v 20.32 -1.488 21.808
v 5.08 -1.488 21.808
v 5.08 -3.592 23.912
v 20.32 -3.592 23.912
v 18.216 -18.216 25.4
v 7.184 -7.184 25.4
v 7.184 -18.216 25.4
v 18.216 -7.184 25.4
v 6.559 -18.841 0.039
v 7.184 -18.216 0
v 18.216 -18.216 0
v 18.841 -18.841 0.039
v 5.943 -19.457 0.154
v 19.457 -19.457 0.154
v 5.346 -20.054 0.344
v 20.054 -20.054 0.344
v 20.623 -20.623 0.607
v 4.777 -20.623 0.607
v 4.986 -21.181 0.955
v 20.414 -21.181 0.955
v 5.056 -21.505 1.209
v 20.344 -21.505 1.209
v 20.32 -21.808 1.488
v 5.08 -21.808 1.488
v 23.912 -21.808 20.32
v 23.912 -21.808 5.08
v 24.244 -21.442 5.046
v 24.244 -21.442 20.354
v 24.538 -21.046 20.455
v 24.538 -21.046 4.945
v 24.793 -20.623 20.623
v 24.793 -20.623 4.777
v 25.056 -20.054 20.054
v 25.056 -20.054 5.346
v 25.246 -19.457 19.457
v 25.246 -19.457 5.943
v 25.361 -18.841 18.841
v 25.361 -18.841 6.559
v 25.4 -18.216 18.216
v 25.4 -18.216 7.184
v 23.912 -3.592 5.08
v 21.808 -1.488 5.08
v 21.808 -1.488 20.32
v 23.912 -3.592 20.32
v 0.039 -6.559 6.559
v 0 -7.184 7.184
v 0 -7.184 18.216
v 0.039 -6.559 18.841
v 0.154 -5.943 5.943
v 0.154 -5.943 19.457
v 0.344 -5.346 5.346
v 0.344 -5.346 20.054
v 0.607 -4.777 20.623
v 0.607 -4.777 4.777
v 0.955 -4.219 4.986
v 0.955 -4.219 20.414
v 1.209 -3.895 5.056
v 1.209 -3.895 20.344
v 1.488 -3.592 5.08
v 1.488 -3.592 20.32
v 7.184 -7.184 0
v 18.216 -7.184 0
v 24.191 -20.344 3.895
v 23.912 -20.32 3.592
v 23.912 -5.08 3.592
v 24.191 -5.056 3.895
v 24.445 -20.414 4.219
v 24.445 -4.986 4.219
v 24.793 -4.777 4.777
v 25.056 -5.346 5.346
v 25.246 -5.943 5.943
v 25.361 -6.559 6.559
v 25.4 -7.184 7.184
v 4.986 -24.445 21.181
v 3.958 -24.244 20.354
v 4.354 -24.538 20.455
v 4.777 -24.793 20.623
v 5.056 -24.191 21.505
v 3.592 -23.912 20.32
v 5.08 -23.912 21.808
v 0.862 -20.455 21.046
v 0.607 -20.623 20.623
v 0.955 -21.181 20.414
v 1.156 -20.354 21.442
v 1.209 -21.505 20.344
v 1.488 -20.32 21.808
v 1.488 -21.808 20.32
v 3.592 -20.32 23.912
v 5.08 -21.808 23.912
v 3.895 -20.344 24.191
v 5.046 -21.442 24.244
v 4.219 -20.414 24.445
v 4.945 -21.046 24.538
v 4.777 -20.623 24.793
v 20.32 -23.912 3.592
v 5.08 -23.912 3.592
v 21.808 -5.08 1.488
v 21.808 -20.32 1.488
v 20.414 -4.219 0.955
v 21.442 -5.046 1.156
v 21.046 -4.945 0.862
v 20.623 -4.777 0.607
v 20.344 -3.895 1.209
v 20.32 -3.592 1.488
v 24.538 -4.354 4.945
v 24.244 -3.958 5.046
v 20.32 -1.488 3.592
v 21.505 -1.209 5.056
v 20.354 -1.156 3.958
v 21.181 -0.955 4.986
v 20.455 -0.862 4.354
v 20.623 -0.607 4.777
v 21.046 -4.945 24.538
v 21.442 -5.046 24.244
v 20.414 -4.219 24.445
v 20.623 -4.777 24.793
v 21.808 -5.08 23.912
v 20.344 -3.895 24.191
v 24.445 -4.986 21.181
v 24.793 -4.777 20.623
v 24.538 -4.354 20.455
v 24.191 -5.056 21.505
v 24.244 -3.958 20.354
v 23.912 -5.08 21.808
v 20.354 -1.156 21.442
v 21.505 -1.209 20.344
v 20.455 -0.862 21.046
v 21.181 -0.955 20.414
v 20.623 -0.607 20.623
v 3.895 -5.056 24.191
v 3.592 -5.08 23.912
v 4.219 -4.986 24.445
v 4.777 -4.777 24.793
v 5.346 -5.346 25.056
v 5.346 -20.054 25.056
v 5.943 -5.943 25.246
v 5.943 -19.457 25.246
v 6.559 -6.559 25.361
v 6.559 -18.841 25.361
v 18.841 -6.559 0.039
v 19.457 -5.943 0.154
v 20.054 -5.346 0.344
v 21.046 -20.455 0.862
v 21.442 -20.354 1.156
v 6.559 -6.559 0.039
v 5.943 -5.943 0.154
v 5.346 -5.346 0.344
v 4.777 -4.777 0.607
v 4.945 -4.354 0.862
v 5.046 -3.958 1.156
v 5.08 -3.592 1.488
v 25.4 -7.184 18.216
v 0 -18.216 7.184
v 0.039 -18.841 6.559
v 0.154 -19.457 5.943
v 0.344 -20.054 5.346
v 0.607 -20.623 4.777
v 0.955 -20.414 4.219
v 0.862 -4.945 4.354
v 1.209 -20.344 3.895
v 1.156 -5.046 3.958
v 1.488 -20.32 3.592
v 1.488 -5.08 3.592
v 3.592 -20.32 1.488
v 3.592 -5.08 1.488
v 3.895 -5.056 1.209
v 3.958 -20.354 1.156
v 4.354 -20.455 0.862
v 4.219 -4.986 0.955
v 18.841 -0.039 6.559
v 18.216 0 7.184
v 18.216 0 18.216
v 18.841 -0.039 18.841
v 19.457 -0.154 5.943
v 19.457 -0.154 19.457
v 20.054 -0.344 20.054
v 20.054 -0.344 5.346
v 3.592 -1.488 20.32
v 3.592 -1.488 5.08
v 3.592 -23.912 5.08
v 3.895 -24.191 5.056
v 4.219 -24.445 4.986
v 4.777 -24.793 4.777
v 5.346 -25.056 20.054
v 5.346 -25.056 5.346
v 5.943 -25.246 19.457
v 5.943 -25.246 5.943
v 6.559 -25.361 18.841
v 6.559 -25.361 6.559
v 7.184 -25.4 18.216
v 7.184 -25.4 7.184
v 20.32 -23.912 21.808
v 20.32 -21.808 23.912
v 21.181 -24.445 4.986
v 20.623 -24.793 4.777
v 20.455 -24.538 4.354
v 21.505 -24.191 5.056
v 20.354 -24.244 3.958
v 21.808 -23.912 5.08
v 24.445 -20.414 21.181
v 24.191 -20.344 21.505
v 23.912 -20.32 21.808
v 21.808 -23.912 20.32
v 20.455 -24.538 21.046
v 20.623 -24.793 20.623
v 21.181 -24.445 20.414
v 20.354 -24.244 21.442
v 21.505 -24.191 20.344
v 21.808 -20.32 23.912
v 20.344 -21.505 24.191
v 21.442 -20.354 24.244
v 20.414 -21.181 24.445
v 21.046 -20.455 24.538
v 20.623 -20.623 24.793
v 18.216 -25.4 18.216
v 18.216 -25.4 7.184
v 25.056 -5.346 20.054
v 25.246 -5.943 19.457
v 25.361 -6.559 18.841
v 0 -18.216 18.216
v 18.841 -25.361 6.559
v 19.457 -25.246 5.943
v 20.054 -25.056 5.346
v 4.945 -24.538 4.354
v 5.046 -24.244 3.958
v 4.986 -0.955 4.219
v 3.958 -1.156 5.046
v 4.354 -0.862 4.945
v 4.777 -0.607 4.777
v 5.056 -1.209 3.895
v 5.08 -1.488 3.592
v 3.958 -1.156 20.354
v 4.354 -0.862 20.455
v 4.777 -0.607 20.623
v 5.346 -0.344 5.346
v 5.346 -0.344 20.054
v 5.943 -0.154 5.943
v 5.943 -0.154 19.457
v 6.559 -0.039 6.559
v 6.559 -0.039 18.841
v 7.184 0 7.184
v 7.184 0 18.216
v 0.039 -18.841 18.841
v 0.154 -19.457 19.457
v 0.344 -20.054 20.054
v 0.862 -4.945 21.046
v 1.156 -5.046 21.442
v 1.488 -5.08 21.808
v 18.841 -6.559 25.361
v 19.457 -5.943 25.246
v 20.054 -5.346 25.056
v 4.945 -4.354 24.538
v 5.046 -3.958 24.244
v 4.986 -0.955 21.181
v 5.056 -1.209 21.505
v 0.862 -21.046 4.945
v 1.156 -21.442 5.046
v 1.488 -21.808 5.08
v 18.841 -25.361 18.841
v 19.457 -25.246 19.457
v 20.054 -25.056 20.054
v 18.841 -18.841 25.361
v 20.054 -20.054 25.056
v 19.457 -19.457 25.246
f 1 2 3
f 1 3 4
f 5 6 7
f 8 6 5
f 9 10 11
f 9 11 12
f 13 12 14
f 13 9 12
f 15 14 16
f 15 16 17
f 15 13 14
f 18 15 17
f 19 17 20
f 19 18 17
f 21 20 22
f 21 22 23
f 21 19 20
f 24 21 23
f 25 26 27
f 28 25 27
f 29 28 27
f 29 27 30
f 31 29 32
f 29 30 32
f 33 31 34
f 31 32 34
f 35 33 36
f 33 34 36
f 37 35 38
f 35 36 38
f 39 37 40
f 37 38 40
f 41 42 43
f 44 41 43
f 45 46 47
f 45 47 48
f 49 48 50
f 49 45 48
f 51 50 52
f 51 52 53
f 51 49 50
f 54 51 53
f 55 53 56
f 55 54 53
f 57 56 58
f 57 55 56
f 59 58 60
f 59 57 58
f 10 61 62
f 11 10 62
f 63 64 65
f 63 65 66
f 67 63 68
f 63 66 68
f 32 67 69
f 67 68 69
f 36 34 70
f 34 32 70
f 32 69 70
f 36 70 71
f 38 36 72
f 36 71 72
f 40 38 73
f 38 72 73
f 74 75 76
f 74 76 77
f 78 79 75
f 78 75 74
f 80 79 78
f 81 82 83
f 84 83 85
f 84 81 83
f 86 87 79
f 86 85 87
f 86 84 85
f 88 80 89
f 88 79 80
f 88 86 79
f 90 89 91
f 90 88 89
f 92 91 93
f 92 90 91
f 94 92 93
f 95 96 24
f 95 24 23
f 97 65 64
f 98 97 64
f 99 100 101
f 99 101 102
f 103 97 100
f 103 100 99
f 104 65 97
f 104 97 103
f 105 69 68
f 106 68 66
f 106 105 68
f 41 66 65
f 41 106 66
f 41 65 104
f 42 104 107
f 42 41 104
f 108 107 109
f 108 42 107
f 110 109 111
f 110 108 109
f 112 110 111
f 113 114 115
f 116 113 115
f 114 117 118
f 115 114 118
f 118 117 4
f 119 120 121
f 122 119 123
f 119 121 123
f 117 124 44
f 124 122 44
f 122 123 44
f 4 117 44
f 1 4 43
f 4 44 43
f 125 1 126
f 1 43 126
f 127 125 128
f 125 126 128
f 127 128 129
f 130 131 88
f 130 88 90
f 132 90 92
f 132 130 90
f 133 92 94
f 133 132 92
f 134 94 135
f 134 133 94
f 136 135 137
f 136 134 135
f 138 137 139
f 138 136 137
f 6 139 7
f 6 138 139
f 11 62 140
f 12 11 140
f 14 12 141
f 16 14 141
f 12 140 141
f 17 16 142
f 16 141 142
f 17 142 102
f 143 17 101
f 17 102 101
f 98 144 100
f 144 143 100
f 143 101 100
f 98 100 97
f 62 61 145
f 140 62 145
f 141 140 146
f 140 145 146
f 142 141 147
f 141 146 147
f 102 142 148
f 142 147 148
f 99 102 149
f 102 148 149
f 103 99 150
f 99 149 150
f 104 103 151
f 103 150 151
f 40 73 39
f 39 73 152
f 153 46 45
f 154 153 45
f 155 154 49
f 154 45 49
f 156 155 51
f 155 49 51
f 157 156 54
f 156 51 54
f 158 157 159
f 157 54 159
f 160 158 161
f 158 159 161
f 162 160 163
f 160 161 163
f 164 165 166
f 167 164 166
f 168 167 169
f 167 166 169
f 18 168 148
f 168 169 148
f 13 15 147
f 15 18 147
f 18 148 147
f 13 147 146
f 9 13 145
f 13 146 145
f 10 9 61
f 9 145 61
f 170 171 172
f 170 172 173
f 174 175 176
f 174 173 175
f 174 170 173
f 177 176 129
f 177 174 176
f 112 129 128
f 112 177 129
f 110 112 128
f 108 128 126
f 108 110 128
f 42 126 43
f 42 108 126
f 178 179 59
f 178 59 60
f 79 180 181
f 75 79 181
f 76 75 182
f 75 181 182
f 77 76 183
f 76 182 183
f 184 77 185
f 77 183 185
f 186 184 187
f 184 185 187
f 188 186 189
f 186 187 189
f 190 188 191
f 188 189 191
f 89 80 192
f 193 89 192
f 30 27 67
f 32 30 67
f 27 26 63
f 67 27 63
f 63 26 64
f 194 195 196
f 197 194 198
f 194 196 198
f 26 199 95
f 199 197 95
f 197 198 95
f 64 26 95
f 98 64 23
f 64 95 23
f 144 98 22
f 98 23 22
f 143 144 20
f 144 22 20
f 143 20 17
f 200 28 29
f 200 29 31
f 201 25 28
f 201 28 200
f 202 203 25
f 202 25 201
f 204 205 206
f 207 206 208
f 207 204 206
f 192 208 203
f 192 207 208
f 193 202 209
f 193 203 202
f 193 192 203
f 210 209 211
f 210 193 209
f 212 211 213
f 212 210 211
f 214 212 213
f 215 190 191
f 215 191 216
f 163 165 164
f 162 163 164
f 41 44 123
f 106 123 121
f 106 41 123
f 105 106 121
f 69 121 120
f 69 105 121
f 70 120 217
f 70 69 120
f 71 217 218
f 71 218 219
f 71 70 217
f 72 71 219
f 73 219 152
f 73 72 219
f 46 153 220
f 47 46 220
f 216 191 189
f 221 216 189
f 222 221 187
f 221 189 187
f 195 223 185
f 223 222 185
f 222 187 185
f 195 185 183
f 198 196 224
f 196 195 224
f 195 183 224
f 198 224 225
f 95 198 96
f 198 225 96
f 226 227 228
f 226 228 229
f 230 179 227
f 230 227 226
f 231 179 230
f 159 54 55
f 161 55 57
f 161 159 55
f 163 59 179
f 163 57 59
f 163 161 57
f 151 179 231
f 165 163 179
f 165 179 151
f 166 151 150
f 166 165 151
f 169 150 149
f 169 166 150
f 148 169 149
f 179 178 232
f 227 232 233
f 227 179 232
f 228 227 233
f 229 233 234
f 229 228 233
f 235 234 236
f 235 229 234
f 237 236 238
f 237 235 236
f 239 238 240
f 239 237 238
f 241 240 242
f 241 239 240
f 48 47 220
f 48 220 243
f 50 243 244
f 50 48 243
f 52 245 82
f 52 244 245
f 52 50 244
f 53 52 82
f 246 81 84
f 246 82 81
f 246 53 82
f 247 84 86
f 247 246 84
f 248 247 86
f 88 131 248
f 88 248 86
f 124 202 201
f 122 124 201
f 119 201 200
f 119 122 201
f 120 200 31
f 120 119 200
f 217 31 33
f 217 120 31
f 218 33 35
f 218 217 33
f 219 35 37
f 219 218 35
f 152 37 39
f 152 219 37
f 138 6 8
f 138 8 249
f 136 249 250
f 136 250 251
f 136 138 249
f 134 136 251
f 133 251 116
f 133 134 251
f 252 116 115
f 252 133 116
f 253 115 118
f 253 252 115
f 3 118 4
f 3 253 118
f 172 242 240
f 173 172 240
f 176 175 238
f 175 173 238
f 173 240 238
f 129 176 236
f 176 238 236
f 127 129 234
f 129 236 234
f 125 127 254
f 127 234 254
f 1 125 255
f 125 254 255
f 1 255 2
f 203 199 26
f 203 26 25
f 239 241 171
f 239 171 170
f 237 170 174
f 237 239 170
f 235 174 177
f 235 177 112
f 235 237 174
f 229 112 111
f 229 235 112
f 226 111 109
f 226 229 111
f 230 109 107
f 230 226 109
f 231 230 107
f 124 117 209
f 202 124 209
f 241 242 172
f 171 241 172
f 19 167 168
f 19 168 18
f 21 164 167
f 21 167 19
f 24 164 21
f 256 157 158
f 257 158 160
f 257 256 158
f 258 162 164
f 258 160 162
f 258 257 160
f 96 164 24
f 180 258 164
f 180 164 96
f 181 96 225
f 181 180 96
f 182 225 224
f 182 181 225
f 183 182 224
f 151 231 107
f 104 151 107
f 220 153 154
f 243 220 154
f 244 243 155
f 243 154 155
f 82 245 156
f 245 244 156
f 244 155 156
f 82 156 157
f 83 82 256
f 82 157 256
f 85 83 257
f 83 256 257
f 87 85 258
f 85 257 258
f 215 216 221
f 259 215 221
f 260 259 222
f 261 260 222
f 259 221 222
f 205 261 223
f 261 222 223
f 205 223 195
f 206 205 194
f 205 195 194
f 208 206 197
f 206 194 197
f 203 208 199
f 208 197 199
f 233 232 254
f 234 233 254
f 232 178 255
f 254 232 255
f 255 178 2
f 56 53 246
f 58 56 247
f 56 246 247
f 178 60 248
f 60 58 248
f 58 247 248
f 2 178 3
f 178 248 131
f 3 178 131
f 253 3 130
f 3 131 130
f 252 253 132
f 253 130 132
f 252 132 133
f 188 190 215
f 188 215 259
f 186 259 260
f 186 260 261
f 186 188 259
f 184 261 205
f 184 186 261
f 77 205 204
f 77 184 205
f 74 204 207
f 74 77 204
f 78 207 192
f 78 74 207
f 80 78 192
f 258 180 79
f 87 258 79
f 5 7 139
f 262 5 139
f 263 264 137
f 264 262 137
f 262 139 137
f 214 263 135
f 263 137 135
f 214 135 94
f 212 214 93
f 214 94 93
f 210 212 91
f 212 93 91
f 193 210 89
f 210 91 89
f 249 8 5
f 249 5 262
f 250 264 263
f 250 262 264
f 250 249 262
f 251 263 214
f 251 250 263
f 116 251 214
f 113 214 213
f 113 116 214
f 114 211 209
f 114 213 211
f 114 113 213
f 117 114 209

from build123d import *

# Parameters (mm, degrees)
F0_W        = 25.4
F0_H        = 25.4
F1_DEPTH    = 25.4
F2_SIZE     = 5.08
F3_T1_DEPTH = 25.7610244843
F3_T3_DEPTH = 25.7610244843
F3_T5_DEPTH = 25.7610244843


# Not quite as in the source:
# - a fillet or chamfer that OpenCascade refuses, or shapes differently, is made with other operations: its cross-section is extruded or revolved along the edge and cut away or added


with BuildPart() as f1:
    # F0 (on Front) → F1 (new body)
    with BuildSketch(Plane.XZ):
        with Locations((12.7, 12.7)):
            Rectangle(F0_W, F0_H)
    extrude(amount=F1_DEPTH)

    # F2
    f2_edges = [f1.edges().sort_by_distance(p)[0] for p in [
        (0, -12.7, 25.4),
        (0, -25.4, 12.7),
        (12.7, -25.4, 25.4),
        (0, -12.7, 0),
        (12.7, -25.4, 0),
        (0, 0, 12.7),
        (25.4, -25.4, 12.7),
        (25.4, 0, 12.7),
        (25.4, -12.7, 25.4),
        (25.4, -12.7, 0),
        (12.7, 0, 25.4),
        (12.7, 0, 0),
    ]]
    chamfer(f2_edges, length=F2_SIZE)

    # F3: fillet of radius 5.08 on 24 edges, made by hand

    # F3_s2 → F3_t1 (cut)
    with BuildSketch(Plane.YZ.offset(-0.1805122421)):
        with BuildLine():
            ThreePointArc((-25.4, 18.2157951031), (-25.0133080252, 20.1598269396), (-23.9121024484, 21.8078975516))
            Line((-23.9121024484, 21.8078975516), (-25.4, 20.32))
            Line((-25.4, 20.32), (-25.4, 18.2157951031))
        make_face()
        with BuildLine():
            ThreePointArc((-25.4, 7.1842048969), (-25.0133080252, 5.2401730604), (-23.9121024484, 3.5921024484))
            Line((-23.9121024484, 3.5921024484), (-25.4, 5.08))
            Line((-25.4, 5.08), (-25.4, 7.1842048969))
        make_face()
        with BuildLine():
            ThreePointArc((0, 18.2157951031), (-0.3866919748, 20.1598269396), (-1.4878975516, 21.8078975516))
            Line((-1.4878975516, 21.8078975516), (0, 20.32))
            Line((0, 20.32), (0, 18.2157951031))
        make_face()
        with BuildLine():
            ThreePointArc((0, 7.1842048969), (-0.3866919748, 5.2401730604), (-1.4878975516, 3.5921024484))
            Line((-1.4878975516, 3.5921024484), (0, 5.08))
            Line((0, 5.08), (0, 7.1842048969))
        make_face()
        with BuildLine():
            ThreePointArc((-18.2157951031, 0), (-20.1598269396, 0.3866919748), (-21.8078975516, 1.4878975516))
            Line((-21.8078975516, 1.4878975516), (-20.32, 0))
            Line((-20.32, 0), (-18.2157951031, 0))
        make_face()
        with BuildLine():
            ThreePointArc((-7.1842048969, 0), (-5.2401730604, 0.3866919748), (-3.5921024484, 1.4878975516))
            Line((-3.5921024484, 1.4878975516), (-5.08, 0))
            Line((-5.08, 0), (-7.1842048969, 0))
        make_face()
        with BuildLine():
            ThreePointArc((-18.2157951031, 25.4), (-20.1598269396, 25.0133080252), (-21.8078975516, 23.9121024484))
            Line((-21.8078975516, 23.9121024484), (-20.32, 25.4))
            Line((-20.32, 25.4), (-18.2157951031, 25.4))
        make_face()
        with BuildLine():
            ThreePointArc((-7.1842048969, 25.4), (-5.2401730604, 25.0133080252), (-3.5921024484, 23.9121024484))
            Line((-3.5921024484, 23.9121024484), (-5.08, 25.4))
            Line((-5.08, 25.4), (-7.1842048969, 25.4))
        make_face()
    extrude(amount=F3_T1_DEPTH, mode=Mode.SUBTRACT)

    # F3_s4 → F3_t3 (cut)
    with BuildSketch(Plane.XY.offset(-0.1805122421)):
        with BuildLine():
            ThreePointArc((3.5921024484, -23.9121024484), (5.2401730604, -25.0133080252), (7.1842048969, -25.4))
            Line((7.1842048969, -25.4), (5.08, -25.4))
            Line((5.08, -25.4), (3.5921024484, -23.9121024484))
        make_face()
        with BuildLine():
            ThreePointArc((18.2157951031, -25.4), (20.1598269396, -25.0133080252), (21.8078975516, -23.9121024484))
            Line((21.8078975516, -23.9121024484), (20.32, -25.4))
            Line((20.32, -25.4), (18.2157951031, -25.4))
        make_face()
        with BuildLine():
            ThreePointArc((0, -7.1842048969), (0.3866919748, -5.2401730604), (1.4878975516, -3.5921024484))
            Line((1.4878975516, -3.5921024484), (0, -5.08))
            Line((0, -5.08), (0, -7.1842048969))
        make_face()
        with BuildLine():
            ThreePointArc((0, -18.2157951031), (0.3866919748, -20.1598269396), (1.4878975516, -21.8078975516))
            Line((1.4878975516, -21.8078975516), (0, -20.32))
            Line((0, -20.32), (0, -18.2157951031))
        make_face()
        with BuildLine():
            ThreePointArc((18.2157951031, 0), (20.1598269396, -0.3866919748), (21.8078975516, -1.4878975516))
            Line((21.8078975516, -1.4878975516), (20.32, 0))
            Line((20.32, 0), (18.2157951031, 0))
        make_face()
        with BuildLine():
            ThreePointArc((3.5921024484, -1.4878975516), (5.2401730604, -0.3866919748), (7.1842048969, 0))
            Line((7.1842048969, 0), (5.08, 0))
            Line((5.08, 0), (3.5921024484, -1.4878975516))
        make_face()
        with BuildLine():
            ThreePointArc((23.9121024484, -21.8078975516), (25.0133080252, -20.1598269396), (25.4, -18.2157951031))
            Line((25.4, -18.2157951031), (25.4, -20.32))
            Line((25.4, -20.32), (23.9121024484, -21.8078975516))
        make_face()
        with BuildLine():
            ThreePointArc((23.9121024484, -3.5921024484), (25.0133080252, -5.2401730604), (25.4, -7.1842048969))
            Line((25.4, -7.1842048969), (25.4, -5.08))
            Line((25.4, -5.08), (23.9121024484, -3.5921024484))
        make_face()
    extrude(amount=F3_T3_DEPTH, mode=Mode.SUBTRACT)

    # F3_s6 → F3_t5 (cut)
    with BuildSketch(Plane.XZ.offset(-0.1805122421)):
        with BuildLine():
            ThreePointArc((0, 18.2157951031), (0.3866919748, 20.1598269396), (1.4878975516, 21.8078975516))
            Line((1.4878975516, 21.8078975516), (0, 20.32))
            Line((0, 20.32), (0, 18.2157951031))
        make_face()
        with BuildLine():
            ThreePointArc((0, 7.1842048969), (0.3866919748, 5.2401730604), (1.4878975516, 3.5921024484))
            Line((1.4878975516, 3.5921024484), (0, 5.08))
            Line((0, 5.08), (0, 7.1842048969))
        make_face()
        with BuildLine():
            ThreePointArc((23.9121024484, 21.8078975516), (25.0133080252, 20.1598269396), (25.4, 18.2157951031))
            Line((25.4, 18.2157951031), (25.4, 20.32))
            Line((25.4, 20.32), (23.9121024484, 21.8078975516))
        make_face()
        with BuildLine():
            ThreePointArc((23.9121024484, 3.5921024484), (25.0133080252, 5.2401730604), (25.4, 7.1842048969))
            Line((25.4, 7.1842048969), (25.4, 5.08))
            Line((25.4, 5.08), (23.9121024484, 3.5921024484))
        make_face()
        with BuildLine():
            ThreePointArc((3.5921024484, 1.4878975516), (5.2401730604, 0.3866919748), (7.1842048969, 0))
            Line((7.1842048969, 0), (5.08, 0))
            Line((5.08, 0), (3.5921024484, 1.4878975516))
        make_face()
        with BuildLine():
            ThreePointArc((18.2157951031, 0), (20.1598269396, 0.3866919748), (21.8078975516, 1.4878975516))
            Line((21.8078975516, 1.4878975516), (20.32, 0))
            Line((20.32, 0), (18.2157951031, 0))
        make_face()
        with BuildLine():
            ThreePointArc((18.2157951031, 25.4), (20.1598269396, 25.0133080252), (21.8078975516, 23.9121024484))
            Line((21.8078975516, 23.9121024484), (20.32, 25.4))
            Line((20.32, 25.4), (18.2157951031, 25.4))
        make_face()
        with BuildLine():
            ThreePointArc((3.5921024484, 23.9121024484), (5.2401730604, 25.0133080252), (7.1842048969, 25.4))
            Line((7.1842048969, 25.4), (5.08, 25.4))
            Line((5.08, 25.4), (3.5921024484, 23.9121024484))
        make_face()
    extrude(amount=F3_T5_DEPTH, mode=Mode.SUBTRACT)


solid = f1.part
